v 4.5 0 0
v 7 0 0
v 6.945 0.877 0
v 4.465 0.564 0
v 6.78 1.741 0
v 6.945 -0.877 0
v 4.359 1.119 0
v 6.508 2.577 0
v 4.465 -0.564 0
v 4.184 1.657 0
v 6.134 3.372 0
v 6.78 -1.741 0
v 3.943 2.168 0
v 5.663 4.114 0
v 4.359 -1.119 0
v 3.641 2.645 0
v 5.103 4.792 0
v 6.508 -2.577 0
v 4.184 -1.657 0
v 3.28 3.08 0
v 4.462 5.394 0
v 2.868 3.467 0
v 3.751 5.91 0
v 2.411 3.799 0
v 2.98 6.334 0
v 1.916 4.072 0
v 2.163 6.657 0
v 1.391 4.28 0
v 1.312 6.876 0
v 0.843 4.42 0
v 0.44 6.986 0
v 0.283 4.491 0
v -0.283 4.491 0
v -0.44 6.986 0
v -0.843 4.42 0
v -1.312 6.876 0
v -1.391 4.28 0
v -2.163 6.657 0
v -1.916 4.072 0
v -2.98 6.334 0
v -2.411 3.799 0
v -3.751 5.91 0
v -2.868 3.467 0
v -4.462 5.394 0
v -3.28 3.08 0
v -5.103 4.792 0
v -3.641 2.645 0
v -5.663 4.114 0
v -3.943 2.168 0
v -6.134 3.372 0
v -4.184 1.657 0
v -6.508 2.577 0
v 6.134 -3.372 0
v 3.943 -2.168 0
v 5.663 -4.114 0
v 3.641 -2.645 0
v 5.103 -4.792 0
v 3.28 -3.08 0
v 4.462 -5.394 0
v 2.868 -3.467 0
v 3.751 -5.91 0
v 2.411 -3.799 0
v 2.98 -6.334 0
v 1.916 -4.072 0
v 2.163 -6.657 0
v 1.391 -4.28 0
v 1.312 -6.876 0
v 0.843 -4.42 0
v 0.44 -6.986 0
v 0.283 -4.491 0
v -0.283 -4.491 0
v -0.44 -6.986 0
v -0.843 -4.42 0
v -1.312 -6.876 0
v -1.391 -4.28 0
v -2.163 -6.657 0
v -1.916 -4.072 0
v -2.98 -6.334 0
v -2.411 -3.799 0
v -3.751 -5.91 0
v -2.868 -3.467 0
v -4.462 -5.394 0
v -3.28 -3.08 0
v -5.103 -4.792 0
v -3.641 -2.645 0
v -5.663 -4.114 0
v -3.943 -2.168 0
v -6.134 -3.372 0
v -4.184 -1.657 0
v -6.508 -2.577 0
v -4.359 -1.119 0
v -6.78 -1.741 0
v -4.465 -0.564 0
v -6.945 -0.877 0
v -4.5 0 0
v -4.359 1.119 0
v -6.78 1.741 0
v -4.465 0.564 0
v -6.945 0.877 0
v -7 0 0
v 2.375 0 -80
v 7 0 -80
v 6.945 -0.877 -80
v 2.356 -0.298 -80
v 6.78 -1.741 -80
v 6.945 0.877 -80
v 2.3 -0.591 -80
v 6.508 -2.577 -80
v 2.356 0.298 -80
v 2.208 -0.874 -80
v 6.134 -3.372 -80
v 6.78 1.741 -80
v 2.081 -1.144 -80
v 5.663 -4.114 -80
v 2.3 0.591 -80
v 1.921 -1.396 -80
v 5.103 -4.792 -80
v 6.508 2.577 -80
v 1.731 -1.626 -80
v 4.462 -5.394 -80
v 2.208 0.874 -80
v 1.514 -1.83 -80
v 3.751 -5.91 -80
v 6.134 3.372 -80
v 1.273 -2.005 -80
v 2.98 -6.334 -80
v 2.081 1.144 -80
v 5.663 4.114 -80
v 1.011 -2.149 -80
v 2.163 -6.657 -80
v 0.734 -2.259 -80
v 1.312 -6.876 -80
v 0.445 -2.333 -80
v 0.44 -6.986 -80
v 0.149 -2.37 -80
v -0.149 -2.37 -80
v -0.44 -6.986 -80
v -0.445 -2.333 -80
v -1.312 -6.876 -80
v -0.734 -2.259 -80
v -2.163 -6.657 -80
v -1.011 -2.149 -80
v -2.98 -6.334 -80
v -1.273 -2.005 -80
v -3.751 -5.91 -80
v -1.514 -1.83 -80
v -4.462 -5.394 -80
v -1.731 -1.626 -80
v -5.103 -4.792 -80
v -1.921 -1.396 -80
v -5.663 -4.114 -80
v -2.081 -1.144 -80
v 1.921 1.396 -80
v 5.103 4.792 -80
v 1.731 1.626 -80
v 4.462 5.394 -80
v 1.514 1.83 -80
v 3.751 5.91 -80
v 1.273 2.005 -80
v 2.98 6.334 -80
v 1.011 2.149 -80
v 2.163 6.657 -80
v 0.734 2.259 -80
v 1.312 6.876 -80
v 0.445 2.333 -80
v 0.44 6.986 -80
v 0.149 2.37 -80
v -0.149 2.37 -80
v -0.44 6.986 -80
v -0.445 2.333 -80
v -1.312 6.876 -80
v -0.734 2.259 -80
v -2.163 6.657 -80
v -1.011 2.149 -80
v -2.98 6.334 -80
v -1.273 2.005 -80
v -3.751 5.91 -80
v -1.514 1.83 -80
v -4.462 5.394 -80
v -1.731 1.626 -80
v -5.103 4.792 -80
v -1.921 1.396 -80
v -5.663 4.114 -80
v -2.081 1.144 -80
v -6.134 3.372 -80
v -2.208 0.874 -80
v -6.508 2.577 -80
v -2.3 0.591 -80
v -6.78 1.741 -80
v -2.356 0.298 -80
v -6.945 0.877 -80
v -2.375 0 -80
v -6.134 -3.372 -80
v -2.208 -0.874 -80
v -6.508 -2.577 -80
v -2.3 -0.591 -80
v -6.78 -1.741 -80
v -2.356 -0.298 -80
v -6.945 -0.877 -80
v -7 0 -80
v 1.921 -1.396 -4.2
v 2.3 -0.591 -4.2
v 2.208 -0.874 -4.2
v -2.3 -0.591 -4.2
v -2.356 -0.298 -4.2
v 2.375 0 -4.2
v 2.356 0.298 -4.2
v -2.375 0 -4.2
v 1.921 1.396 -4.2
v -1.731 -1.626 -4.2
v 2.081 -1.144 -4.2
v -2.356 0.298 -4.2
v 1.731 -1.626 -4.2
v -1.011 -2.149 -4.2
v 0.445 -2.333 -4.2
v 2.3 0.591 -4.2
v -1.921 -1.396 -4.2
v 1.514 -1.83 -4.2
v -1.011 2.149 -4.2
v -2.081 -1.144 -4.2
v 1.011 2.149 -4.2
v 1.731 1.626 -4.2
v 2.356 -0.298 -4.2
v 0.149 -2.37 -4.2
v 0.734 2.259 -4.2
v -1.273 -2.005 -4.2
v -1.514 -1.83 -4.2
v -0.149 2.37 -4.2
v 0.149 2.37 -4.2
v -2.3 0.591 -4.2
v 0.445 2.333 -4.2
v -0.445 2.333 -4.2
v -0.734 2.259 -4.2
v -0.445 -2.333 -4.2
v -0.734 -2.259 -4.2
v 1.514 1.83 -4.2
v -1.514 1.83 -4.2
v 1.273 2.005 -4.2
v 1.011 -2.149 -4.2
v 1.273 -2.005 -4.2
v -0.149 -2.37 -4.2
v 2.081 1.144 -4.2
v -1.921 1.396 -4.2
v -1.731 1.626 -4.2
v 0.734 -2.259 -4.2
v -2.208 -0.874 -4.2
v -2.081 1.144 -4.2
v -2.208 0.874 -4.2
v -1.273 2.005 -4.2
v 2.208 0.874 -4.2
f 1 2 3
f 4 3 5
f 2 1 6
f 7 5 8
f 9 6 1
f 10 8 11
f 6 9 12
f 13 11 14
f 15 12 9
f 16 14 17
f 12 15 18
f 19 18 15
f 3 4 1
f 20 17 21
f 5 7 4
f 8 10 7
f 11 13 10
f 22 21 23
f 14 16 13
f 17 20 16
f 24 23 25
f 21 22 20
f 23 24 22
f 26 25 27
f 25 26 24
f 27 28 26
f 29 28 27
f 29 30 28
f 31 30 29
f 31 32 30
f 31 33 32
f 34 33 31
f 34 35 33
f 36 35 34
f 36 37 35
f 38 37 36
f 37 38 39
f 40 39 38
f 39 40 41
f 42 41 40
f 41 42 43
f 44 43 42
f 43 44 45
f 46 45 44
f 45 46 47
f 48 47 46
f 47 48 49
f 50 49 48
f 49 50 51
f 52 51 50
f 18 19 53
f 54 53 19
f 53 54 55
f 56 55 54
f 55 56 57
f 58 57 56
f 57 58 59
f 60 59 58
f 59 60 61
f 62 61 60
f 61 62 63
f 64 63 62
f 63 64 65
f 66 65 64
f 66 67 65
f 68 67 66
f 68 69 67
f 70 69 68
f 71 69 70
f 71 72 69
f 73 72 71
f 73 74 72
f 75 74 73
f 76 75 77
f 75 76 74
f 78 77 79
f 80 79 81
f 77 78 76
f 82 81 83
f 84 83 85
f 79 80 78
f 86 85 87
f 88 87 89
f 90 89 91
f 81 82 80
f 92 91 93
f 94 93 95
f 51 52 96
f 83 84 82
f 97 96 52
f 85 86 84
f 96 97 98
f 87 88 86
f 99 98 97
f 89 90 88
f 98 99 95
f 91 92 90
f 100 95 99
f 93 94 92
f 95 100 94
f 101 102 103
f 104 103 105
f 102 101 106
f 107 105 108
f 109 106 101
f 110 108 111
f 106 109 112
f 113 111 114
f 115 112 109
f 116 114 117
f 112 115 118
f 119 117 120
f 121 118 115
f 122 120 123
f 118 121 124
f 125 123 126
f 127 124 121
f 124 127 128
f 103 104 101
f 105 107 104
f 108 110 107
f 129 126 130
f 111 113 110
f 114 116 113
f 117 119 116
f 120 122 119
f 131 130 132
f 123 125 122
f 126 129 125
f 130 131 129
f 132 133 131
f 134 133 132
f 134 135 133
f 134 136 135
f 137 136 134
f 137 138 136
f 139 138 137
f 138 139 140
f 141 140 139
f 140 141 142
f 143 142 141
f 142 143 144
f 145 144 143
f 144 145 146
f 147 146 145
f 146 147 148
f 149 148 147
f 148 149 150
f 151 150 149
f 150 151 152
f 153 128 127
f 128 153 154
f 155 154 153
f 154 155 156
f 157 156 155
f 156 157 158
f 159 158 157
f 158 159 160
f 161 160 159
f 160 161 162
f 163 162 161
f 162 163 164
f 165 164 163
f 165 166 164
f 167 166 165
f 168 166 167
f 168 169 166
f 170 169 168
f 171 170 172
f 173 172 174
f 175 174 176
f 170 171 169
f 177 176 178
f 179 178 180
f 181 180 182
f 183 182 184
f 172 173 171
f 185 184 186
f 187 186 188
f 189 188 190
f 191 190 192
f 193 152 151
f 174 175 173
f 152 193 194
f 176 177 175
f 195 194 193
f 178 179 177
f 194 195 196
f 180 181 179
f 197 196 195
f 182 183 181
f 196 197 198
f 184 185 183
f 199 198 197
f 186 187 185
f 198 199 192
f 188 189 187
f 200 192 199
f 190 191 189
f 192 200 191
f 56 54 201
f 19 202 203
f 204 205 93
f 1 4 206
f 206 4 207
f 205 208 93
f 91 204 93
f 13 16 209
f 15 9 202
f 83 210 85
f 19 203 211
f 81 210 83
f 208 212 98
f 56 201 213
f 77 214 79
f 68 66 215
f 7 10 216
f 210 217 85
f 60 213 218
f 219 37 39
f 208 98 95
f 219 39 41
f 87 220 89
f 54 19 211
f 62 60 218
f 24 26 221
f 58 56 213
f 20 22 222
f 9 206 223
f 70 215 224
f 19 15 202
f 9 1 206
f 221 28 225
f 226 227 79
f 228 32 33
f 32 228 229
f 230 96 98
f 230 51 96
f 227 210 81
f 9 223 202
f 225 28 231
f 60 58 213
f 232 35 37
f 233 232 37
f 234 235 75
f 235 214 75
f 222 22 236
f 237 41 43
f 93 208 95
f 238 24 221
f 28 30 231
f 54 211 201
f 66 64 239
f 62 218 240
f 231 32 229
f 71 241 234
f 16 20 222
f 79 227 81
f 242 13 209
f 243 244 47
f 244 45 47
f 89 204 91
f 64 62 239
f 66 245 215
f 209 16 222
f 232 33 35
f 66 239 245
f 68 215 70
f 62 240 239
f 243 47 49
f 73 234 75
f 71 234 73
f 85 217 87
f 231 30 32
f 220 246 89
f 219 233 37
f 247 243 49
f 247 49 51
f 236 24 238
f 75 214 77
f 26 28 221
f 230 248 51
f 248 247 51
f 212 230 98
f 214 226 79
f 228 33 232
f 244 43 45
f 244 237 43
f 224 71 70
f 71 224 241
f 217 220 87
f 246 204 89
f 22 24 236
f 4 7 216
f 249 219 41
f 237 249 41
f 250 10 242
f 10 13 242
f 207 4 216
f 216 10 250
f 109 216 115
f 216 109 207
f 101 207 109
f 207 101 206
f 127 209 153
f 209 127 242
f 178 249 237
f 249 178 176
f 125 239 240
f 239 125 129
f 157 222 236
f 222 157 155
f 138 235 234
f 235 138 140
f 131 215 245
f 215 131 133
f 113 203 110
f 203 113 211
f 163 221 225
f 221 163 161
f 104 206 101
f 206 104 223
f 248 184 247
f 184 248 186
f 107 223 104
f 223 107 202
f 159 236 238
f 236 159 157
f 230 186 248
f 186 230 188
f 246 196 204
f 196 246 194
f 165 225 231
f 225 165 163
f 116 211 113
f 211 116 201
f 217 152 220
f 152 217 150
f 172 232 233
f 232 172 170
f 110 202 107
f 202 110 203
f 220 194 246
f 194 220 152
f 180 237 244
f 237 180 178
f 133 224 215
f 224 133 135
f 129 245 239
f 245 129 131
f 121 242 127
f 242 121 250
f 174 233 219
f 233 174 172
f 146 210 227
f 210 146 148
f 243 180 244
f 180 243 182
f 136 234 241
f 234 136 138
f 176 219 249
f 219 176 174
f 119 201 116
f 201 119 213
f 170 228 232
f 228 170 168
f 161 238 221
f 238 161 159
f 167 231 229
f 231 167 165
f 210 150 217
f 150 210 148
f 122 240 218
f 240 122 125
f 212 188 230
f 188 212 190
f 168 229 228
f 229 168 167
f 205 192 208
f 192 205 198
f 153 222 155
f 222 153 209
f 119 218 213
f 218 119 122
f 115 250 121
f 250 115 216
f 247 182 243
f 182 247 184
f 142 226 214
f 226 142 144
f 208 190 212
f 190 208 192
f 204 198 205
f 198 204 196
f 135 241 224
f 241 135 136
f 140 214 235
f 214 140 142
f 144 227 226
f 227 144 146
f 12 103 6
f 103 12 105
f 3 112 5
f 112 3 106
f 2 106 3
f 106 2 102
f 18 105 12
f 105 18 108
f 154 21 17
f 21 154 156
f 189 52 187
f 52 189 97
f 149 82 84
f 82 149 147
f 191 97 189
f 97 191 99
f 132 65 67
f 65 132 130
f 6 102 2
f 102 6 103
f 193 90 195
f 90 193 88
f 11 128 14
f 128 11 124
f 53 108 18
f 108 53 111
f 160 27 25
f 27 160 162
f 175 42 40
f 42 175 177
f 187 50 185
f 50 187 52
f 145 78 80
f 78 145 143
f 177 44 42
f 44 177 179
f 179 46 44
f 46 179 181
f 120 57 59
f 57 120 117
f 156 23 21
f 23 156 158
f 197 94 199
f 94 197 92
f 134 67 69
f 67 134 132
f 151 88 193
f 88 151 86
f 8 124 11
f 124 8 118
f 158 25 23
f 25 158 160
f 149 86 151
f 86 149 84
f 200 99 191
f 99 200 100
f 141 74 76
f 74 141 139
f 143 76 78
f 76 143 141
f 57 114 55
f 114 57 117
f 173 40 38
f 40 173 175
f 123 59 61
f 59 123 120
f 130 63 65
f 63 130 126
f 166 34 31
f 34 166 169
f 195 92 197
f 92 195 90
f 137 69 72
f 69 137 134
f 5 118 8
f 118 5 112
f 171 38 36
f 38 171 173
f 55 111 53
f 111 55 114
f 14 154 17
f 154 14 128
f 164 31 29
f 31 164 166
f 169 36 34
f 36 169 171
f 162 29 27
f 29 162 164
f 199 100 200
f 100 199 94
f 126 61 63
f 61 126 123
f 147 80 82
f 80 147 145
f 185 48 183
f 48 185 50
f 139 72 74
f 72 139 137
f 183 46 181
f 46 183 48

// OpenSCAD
$fn = 50;


difference() {
	union() {
		translate(v = [0, 0, -80.0000000000]) {
			cylinder(h = 80, r = 7.0000000000);
		}
		cylinder(h = 0, r = 10.0000000000);
	}
	union() {
		translate(v = [0, 0, 0]) {
			rotate(a = [0, 0, 0]) {
				difference() {
					union() {
						#translate(v = [0, 0, -80.0000000000]) {
							cylinder(h = 80, r = 2.2500000000);
						}
						#translate(v = [0, 0, -4.2000000000]) {
							cylinder(h = 4.2000000000, r = 7.0000000000, r1 = 2.3750000000, r2 = 4.5000000000);
						}
						#translate(v = [0, 0, -80.0000000000]) {
							cylinder(h = 80, r = 2.3750000000);
						}
						#translate(v = [0, 0, -80.0000000000]) {
							cylinder(h = 80, r = 2.2500000000);
						}
					}
					union();
				}
			}
		}
	}
}
